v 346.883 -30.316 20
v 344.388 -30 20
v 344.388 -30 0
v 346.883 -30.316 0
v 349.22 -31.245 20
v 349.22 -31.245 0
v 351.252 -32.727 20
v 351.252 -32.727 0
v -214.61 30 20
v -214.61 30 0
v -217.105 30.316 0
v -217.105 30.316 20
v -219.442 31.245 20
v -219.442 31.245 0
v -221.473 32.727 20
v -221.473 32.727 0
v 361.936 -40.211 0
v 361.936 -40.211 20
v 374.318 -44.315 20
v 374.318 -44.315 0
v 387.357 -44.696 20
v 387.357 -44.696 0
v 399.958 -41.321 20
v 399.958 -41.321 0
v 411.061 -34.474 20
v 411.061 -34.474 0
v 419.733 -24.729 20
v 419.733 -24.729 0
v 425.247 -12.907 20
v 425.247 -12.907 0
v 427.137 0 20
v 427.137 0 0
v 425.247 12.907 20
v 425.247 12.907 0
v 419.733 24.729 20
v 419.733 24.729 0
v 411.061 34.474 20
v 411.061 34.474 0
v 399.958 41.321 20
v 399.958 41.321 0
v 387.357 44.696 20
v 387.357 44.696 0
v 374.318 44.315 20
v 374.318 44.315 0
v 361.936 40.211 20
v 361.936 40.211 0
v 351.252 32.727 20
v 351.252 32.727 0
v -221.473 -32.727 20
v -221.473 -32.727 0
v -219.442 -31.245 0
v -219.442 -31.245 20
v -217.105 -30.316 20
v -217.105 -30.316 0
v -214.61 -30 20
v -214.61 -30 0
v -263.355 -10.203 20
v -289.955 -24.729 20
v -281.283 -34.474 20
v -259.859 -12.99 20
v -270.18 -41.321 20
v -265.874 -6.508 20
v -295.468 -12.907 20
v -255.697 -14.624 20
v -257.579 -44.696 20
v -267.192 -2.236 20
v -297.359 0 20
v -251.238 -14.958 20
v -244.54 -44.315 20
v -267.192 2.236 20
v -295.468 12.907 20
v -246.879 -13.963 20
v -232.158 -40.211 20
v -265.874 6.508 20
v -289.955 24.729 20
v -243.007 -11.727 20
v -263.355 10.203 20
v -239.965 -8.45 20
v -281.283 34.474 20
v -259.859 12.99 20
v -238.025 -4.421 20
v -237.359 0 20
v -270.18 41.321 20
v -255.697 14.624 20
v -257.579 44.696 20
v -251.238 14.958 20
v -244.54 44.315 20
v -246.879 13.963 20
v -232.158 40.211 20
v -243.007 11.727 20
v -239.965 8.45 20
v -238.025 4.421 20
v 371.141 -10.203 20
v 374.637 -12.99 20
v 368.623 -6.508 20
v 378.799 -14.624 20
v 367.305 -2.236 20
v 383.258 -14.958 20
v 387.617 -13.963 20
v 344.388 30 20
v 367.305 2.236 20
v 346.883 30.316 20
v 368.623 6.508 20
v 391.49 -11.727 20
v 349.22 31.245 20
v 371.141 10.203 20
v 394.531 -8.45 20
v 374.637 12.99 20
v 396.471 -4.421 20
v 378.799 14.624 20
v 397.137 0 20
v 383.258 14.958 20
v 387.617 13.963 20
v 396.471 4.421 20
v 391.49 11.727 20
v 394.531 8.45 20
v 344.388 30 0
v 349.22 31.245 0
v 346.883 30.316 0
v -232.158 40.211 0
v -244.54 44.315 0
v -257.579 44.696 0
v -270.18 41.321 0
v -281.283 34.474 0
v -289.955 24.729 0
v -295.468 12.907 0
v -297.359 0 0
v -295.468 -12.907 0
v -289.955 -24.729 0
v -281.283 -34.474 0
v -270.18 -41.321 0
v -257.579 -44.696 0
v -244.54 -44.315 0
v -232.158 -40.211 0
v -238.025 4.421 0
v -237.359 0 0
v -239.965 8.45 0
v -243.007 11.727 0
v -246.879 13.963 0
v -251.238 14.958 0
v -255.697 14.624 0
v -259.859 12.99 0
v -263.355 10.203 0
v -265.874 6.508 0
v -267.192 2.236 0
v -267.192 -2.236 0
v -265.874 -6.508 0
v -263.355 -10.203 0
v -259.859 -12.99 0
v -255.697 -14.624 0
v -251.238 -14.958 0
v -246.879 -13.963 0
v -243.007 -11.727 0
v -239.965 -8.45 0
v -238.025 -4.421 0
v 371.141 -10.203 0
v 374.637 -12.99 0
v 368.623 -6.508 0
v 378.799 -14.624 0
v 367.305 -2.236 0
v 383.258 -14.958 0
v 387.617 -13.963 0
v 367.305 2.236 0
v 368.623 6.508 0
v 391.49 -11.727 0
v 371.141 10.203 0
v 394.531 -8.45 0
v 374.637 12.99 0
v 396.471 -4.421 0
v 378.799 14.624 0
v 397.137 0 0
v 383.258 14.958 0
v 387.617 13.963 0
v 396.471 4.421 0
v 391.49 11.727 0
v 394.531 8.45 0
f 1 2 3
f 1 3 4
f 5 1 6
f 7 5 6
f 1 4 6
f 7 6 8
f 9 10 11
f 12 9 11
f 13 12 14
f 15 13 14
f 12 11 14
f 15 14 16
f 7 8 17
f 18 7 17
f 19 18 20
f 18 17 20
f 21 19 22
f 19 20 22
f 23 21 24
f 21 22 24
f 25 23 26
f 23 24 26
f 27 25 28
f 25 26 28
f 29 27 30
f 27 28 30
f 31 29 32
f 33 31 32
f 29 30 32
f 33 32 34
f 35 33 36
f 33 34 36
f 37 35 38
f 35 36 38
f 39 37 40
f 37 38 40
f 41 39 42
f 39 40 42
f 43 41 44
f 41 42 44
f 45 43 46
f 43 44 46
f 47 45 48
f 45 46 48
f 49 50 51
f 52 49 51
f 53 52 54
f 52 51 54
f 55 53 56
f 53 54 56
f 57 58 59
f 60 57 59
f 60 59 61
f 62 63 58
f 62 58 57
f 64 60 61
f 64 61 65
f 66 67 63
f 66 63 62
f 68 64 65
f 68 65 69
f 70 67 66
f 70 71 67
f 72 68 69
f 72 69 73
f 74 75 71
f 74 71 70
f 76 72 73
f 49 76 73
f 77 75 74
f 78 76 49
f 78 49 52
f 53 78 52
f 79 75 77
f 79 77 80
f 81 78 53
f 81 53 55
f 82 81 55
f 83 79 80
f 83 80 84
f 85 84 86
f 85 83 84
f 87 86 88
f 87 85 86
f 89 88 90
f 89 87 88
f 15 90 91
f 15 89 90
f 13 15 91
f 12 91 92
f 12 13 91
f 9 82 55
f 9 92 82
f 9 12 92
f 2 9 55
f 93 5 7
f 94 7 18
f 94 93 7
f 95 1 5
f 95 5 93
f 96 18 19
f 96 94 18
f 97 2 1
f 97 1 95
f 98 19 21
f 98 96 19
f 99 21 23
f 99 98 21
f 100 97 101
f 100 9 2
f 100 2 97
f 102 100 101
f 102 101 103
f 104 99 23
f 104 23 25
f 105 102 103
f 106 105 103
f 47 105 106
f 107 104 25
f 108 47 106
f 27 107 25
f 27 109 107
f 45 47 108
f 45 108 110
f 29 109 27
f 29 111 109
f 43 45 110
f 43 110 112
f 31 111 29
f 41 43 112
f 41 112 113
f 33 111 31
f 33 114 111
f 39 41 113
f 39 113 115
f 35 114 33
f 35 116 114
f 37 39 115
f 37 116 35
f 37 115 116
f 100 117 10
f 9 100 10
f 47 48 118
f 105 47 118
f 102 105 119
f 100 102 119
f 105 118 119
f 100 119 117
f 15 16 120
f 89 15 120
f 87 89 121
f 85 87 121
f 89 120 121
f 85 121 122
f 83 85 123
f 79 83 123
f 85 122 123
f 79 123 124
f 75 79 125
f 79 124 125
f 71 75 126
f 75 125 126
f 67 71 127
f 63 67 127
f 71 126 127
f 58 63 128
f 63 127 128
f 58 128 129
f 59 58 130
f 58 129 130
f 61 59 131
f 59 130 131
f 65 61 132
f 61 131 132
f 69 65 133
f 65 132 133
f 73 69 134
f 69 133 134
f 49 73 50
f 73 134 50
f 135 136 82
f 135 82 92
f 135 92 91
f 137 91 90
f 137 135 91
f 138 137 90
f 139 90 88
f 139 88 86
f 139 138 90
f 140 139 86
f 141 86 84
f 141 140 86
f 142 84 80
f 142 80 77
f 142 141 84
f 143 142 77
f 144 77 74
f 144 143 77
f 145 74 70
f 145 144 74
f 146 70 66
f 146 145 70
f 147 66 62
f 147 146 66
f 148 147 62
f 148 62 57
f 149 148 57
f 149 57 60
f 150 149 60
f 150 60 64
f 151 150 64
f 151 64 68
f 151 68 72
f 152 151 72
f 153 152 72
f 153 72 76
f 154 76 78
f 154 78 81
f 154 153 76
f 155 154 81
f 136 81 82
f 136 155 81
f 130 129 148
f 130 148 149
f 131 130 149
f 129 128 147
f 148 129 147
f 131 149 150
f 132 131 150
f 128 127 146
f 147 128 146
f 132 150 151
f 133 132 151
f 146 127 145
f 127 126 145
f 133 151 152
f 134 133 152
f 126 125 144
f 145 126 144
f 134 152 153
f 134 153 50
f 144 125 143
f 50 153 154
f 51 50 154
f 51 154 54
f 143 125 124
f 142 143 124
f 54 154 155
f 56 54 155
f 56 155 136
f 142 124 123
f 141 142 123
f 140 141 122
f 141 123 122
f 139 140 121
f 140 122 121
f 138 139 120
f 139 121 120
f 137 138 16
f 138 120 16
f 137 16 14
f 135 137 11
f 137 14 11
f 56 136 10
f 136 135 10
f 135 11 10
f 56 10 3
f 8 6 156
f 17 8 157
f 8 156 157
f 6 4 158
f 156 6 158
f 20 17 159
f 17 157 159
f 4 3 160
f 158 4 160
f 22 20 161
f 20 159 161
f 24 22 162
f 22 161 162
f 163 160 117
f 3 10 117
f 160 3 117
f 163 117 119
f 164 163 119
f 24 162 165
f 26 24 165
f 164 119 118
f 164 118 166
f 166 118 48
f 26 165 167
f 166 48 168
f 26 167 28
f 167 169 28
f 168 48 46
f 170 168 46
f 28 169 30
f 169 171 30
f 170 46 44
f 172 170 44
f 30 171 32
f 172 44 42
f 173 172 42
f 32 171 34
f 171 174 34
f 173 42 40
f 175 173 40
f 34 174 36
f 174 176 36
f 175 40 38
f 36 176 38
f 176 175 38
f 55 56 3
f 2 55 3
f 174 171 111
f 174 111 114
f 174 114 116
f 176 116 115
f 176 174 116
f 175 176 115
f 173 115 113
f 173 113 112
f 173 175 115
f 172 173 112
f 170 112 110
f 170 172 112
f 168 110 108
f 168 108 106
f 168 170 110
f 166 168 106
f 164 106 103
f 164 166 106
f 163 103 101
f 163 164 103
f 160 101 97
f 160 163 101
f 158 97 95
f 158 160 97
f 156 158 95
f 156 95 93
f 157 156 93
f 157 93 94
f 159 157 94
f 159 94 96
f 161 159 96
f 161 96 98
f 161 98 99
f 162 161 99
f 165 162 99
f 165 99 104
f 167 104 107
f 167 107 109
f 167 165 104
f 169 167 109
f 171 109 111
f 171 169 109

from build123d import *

# Parameters (mm, degrees)
F0_R     = 15
F1_DEPTH = 20


with BuildPart() as f1:
    # F0 (on Top) → F1 (new body)
    with BuildSketch(Plane.XY):
        with BuildLine():
            ThreePointArc((344.388068, -30), (348.080813, -30.706796), (351.251554, -32.727273))
            ThreePointArc((351.251554, -32.727273), (427.13724, 0), (351.251554, 32.727273))
            ThreePointArc((351.251554, 32.727273), (348.080813, 30.706796), (344.388068, 30))
            Line((344.388068, 30), (-214.609888, 30))
            ThreePointArc((-214.609888, 30), (-218.302632, 30.706796), (-221.473374, 32.727273))
            ThreePointArc((-221.473374, 32.727273), (-297.35906, 0), (-221.473374, -32.727273))
            ThreePointArc((-221.473374, -32.727273), (-218.302632, -30.706796), (-214.609888, -30))
            Line((-214.609888, -30), (344.388068, -30))
        make_face()
        with Locations((-252.35906, 0)):
            Circle(F0_R, mode=Mode.SUBTRACT)
        with Locations((382.13724, 0)):
            Circle(F0_R, mode=Mode.SUBTRACT)
    extrude(amount=F1_DEPTH)


solid = f1.part
